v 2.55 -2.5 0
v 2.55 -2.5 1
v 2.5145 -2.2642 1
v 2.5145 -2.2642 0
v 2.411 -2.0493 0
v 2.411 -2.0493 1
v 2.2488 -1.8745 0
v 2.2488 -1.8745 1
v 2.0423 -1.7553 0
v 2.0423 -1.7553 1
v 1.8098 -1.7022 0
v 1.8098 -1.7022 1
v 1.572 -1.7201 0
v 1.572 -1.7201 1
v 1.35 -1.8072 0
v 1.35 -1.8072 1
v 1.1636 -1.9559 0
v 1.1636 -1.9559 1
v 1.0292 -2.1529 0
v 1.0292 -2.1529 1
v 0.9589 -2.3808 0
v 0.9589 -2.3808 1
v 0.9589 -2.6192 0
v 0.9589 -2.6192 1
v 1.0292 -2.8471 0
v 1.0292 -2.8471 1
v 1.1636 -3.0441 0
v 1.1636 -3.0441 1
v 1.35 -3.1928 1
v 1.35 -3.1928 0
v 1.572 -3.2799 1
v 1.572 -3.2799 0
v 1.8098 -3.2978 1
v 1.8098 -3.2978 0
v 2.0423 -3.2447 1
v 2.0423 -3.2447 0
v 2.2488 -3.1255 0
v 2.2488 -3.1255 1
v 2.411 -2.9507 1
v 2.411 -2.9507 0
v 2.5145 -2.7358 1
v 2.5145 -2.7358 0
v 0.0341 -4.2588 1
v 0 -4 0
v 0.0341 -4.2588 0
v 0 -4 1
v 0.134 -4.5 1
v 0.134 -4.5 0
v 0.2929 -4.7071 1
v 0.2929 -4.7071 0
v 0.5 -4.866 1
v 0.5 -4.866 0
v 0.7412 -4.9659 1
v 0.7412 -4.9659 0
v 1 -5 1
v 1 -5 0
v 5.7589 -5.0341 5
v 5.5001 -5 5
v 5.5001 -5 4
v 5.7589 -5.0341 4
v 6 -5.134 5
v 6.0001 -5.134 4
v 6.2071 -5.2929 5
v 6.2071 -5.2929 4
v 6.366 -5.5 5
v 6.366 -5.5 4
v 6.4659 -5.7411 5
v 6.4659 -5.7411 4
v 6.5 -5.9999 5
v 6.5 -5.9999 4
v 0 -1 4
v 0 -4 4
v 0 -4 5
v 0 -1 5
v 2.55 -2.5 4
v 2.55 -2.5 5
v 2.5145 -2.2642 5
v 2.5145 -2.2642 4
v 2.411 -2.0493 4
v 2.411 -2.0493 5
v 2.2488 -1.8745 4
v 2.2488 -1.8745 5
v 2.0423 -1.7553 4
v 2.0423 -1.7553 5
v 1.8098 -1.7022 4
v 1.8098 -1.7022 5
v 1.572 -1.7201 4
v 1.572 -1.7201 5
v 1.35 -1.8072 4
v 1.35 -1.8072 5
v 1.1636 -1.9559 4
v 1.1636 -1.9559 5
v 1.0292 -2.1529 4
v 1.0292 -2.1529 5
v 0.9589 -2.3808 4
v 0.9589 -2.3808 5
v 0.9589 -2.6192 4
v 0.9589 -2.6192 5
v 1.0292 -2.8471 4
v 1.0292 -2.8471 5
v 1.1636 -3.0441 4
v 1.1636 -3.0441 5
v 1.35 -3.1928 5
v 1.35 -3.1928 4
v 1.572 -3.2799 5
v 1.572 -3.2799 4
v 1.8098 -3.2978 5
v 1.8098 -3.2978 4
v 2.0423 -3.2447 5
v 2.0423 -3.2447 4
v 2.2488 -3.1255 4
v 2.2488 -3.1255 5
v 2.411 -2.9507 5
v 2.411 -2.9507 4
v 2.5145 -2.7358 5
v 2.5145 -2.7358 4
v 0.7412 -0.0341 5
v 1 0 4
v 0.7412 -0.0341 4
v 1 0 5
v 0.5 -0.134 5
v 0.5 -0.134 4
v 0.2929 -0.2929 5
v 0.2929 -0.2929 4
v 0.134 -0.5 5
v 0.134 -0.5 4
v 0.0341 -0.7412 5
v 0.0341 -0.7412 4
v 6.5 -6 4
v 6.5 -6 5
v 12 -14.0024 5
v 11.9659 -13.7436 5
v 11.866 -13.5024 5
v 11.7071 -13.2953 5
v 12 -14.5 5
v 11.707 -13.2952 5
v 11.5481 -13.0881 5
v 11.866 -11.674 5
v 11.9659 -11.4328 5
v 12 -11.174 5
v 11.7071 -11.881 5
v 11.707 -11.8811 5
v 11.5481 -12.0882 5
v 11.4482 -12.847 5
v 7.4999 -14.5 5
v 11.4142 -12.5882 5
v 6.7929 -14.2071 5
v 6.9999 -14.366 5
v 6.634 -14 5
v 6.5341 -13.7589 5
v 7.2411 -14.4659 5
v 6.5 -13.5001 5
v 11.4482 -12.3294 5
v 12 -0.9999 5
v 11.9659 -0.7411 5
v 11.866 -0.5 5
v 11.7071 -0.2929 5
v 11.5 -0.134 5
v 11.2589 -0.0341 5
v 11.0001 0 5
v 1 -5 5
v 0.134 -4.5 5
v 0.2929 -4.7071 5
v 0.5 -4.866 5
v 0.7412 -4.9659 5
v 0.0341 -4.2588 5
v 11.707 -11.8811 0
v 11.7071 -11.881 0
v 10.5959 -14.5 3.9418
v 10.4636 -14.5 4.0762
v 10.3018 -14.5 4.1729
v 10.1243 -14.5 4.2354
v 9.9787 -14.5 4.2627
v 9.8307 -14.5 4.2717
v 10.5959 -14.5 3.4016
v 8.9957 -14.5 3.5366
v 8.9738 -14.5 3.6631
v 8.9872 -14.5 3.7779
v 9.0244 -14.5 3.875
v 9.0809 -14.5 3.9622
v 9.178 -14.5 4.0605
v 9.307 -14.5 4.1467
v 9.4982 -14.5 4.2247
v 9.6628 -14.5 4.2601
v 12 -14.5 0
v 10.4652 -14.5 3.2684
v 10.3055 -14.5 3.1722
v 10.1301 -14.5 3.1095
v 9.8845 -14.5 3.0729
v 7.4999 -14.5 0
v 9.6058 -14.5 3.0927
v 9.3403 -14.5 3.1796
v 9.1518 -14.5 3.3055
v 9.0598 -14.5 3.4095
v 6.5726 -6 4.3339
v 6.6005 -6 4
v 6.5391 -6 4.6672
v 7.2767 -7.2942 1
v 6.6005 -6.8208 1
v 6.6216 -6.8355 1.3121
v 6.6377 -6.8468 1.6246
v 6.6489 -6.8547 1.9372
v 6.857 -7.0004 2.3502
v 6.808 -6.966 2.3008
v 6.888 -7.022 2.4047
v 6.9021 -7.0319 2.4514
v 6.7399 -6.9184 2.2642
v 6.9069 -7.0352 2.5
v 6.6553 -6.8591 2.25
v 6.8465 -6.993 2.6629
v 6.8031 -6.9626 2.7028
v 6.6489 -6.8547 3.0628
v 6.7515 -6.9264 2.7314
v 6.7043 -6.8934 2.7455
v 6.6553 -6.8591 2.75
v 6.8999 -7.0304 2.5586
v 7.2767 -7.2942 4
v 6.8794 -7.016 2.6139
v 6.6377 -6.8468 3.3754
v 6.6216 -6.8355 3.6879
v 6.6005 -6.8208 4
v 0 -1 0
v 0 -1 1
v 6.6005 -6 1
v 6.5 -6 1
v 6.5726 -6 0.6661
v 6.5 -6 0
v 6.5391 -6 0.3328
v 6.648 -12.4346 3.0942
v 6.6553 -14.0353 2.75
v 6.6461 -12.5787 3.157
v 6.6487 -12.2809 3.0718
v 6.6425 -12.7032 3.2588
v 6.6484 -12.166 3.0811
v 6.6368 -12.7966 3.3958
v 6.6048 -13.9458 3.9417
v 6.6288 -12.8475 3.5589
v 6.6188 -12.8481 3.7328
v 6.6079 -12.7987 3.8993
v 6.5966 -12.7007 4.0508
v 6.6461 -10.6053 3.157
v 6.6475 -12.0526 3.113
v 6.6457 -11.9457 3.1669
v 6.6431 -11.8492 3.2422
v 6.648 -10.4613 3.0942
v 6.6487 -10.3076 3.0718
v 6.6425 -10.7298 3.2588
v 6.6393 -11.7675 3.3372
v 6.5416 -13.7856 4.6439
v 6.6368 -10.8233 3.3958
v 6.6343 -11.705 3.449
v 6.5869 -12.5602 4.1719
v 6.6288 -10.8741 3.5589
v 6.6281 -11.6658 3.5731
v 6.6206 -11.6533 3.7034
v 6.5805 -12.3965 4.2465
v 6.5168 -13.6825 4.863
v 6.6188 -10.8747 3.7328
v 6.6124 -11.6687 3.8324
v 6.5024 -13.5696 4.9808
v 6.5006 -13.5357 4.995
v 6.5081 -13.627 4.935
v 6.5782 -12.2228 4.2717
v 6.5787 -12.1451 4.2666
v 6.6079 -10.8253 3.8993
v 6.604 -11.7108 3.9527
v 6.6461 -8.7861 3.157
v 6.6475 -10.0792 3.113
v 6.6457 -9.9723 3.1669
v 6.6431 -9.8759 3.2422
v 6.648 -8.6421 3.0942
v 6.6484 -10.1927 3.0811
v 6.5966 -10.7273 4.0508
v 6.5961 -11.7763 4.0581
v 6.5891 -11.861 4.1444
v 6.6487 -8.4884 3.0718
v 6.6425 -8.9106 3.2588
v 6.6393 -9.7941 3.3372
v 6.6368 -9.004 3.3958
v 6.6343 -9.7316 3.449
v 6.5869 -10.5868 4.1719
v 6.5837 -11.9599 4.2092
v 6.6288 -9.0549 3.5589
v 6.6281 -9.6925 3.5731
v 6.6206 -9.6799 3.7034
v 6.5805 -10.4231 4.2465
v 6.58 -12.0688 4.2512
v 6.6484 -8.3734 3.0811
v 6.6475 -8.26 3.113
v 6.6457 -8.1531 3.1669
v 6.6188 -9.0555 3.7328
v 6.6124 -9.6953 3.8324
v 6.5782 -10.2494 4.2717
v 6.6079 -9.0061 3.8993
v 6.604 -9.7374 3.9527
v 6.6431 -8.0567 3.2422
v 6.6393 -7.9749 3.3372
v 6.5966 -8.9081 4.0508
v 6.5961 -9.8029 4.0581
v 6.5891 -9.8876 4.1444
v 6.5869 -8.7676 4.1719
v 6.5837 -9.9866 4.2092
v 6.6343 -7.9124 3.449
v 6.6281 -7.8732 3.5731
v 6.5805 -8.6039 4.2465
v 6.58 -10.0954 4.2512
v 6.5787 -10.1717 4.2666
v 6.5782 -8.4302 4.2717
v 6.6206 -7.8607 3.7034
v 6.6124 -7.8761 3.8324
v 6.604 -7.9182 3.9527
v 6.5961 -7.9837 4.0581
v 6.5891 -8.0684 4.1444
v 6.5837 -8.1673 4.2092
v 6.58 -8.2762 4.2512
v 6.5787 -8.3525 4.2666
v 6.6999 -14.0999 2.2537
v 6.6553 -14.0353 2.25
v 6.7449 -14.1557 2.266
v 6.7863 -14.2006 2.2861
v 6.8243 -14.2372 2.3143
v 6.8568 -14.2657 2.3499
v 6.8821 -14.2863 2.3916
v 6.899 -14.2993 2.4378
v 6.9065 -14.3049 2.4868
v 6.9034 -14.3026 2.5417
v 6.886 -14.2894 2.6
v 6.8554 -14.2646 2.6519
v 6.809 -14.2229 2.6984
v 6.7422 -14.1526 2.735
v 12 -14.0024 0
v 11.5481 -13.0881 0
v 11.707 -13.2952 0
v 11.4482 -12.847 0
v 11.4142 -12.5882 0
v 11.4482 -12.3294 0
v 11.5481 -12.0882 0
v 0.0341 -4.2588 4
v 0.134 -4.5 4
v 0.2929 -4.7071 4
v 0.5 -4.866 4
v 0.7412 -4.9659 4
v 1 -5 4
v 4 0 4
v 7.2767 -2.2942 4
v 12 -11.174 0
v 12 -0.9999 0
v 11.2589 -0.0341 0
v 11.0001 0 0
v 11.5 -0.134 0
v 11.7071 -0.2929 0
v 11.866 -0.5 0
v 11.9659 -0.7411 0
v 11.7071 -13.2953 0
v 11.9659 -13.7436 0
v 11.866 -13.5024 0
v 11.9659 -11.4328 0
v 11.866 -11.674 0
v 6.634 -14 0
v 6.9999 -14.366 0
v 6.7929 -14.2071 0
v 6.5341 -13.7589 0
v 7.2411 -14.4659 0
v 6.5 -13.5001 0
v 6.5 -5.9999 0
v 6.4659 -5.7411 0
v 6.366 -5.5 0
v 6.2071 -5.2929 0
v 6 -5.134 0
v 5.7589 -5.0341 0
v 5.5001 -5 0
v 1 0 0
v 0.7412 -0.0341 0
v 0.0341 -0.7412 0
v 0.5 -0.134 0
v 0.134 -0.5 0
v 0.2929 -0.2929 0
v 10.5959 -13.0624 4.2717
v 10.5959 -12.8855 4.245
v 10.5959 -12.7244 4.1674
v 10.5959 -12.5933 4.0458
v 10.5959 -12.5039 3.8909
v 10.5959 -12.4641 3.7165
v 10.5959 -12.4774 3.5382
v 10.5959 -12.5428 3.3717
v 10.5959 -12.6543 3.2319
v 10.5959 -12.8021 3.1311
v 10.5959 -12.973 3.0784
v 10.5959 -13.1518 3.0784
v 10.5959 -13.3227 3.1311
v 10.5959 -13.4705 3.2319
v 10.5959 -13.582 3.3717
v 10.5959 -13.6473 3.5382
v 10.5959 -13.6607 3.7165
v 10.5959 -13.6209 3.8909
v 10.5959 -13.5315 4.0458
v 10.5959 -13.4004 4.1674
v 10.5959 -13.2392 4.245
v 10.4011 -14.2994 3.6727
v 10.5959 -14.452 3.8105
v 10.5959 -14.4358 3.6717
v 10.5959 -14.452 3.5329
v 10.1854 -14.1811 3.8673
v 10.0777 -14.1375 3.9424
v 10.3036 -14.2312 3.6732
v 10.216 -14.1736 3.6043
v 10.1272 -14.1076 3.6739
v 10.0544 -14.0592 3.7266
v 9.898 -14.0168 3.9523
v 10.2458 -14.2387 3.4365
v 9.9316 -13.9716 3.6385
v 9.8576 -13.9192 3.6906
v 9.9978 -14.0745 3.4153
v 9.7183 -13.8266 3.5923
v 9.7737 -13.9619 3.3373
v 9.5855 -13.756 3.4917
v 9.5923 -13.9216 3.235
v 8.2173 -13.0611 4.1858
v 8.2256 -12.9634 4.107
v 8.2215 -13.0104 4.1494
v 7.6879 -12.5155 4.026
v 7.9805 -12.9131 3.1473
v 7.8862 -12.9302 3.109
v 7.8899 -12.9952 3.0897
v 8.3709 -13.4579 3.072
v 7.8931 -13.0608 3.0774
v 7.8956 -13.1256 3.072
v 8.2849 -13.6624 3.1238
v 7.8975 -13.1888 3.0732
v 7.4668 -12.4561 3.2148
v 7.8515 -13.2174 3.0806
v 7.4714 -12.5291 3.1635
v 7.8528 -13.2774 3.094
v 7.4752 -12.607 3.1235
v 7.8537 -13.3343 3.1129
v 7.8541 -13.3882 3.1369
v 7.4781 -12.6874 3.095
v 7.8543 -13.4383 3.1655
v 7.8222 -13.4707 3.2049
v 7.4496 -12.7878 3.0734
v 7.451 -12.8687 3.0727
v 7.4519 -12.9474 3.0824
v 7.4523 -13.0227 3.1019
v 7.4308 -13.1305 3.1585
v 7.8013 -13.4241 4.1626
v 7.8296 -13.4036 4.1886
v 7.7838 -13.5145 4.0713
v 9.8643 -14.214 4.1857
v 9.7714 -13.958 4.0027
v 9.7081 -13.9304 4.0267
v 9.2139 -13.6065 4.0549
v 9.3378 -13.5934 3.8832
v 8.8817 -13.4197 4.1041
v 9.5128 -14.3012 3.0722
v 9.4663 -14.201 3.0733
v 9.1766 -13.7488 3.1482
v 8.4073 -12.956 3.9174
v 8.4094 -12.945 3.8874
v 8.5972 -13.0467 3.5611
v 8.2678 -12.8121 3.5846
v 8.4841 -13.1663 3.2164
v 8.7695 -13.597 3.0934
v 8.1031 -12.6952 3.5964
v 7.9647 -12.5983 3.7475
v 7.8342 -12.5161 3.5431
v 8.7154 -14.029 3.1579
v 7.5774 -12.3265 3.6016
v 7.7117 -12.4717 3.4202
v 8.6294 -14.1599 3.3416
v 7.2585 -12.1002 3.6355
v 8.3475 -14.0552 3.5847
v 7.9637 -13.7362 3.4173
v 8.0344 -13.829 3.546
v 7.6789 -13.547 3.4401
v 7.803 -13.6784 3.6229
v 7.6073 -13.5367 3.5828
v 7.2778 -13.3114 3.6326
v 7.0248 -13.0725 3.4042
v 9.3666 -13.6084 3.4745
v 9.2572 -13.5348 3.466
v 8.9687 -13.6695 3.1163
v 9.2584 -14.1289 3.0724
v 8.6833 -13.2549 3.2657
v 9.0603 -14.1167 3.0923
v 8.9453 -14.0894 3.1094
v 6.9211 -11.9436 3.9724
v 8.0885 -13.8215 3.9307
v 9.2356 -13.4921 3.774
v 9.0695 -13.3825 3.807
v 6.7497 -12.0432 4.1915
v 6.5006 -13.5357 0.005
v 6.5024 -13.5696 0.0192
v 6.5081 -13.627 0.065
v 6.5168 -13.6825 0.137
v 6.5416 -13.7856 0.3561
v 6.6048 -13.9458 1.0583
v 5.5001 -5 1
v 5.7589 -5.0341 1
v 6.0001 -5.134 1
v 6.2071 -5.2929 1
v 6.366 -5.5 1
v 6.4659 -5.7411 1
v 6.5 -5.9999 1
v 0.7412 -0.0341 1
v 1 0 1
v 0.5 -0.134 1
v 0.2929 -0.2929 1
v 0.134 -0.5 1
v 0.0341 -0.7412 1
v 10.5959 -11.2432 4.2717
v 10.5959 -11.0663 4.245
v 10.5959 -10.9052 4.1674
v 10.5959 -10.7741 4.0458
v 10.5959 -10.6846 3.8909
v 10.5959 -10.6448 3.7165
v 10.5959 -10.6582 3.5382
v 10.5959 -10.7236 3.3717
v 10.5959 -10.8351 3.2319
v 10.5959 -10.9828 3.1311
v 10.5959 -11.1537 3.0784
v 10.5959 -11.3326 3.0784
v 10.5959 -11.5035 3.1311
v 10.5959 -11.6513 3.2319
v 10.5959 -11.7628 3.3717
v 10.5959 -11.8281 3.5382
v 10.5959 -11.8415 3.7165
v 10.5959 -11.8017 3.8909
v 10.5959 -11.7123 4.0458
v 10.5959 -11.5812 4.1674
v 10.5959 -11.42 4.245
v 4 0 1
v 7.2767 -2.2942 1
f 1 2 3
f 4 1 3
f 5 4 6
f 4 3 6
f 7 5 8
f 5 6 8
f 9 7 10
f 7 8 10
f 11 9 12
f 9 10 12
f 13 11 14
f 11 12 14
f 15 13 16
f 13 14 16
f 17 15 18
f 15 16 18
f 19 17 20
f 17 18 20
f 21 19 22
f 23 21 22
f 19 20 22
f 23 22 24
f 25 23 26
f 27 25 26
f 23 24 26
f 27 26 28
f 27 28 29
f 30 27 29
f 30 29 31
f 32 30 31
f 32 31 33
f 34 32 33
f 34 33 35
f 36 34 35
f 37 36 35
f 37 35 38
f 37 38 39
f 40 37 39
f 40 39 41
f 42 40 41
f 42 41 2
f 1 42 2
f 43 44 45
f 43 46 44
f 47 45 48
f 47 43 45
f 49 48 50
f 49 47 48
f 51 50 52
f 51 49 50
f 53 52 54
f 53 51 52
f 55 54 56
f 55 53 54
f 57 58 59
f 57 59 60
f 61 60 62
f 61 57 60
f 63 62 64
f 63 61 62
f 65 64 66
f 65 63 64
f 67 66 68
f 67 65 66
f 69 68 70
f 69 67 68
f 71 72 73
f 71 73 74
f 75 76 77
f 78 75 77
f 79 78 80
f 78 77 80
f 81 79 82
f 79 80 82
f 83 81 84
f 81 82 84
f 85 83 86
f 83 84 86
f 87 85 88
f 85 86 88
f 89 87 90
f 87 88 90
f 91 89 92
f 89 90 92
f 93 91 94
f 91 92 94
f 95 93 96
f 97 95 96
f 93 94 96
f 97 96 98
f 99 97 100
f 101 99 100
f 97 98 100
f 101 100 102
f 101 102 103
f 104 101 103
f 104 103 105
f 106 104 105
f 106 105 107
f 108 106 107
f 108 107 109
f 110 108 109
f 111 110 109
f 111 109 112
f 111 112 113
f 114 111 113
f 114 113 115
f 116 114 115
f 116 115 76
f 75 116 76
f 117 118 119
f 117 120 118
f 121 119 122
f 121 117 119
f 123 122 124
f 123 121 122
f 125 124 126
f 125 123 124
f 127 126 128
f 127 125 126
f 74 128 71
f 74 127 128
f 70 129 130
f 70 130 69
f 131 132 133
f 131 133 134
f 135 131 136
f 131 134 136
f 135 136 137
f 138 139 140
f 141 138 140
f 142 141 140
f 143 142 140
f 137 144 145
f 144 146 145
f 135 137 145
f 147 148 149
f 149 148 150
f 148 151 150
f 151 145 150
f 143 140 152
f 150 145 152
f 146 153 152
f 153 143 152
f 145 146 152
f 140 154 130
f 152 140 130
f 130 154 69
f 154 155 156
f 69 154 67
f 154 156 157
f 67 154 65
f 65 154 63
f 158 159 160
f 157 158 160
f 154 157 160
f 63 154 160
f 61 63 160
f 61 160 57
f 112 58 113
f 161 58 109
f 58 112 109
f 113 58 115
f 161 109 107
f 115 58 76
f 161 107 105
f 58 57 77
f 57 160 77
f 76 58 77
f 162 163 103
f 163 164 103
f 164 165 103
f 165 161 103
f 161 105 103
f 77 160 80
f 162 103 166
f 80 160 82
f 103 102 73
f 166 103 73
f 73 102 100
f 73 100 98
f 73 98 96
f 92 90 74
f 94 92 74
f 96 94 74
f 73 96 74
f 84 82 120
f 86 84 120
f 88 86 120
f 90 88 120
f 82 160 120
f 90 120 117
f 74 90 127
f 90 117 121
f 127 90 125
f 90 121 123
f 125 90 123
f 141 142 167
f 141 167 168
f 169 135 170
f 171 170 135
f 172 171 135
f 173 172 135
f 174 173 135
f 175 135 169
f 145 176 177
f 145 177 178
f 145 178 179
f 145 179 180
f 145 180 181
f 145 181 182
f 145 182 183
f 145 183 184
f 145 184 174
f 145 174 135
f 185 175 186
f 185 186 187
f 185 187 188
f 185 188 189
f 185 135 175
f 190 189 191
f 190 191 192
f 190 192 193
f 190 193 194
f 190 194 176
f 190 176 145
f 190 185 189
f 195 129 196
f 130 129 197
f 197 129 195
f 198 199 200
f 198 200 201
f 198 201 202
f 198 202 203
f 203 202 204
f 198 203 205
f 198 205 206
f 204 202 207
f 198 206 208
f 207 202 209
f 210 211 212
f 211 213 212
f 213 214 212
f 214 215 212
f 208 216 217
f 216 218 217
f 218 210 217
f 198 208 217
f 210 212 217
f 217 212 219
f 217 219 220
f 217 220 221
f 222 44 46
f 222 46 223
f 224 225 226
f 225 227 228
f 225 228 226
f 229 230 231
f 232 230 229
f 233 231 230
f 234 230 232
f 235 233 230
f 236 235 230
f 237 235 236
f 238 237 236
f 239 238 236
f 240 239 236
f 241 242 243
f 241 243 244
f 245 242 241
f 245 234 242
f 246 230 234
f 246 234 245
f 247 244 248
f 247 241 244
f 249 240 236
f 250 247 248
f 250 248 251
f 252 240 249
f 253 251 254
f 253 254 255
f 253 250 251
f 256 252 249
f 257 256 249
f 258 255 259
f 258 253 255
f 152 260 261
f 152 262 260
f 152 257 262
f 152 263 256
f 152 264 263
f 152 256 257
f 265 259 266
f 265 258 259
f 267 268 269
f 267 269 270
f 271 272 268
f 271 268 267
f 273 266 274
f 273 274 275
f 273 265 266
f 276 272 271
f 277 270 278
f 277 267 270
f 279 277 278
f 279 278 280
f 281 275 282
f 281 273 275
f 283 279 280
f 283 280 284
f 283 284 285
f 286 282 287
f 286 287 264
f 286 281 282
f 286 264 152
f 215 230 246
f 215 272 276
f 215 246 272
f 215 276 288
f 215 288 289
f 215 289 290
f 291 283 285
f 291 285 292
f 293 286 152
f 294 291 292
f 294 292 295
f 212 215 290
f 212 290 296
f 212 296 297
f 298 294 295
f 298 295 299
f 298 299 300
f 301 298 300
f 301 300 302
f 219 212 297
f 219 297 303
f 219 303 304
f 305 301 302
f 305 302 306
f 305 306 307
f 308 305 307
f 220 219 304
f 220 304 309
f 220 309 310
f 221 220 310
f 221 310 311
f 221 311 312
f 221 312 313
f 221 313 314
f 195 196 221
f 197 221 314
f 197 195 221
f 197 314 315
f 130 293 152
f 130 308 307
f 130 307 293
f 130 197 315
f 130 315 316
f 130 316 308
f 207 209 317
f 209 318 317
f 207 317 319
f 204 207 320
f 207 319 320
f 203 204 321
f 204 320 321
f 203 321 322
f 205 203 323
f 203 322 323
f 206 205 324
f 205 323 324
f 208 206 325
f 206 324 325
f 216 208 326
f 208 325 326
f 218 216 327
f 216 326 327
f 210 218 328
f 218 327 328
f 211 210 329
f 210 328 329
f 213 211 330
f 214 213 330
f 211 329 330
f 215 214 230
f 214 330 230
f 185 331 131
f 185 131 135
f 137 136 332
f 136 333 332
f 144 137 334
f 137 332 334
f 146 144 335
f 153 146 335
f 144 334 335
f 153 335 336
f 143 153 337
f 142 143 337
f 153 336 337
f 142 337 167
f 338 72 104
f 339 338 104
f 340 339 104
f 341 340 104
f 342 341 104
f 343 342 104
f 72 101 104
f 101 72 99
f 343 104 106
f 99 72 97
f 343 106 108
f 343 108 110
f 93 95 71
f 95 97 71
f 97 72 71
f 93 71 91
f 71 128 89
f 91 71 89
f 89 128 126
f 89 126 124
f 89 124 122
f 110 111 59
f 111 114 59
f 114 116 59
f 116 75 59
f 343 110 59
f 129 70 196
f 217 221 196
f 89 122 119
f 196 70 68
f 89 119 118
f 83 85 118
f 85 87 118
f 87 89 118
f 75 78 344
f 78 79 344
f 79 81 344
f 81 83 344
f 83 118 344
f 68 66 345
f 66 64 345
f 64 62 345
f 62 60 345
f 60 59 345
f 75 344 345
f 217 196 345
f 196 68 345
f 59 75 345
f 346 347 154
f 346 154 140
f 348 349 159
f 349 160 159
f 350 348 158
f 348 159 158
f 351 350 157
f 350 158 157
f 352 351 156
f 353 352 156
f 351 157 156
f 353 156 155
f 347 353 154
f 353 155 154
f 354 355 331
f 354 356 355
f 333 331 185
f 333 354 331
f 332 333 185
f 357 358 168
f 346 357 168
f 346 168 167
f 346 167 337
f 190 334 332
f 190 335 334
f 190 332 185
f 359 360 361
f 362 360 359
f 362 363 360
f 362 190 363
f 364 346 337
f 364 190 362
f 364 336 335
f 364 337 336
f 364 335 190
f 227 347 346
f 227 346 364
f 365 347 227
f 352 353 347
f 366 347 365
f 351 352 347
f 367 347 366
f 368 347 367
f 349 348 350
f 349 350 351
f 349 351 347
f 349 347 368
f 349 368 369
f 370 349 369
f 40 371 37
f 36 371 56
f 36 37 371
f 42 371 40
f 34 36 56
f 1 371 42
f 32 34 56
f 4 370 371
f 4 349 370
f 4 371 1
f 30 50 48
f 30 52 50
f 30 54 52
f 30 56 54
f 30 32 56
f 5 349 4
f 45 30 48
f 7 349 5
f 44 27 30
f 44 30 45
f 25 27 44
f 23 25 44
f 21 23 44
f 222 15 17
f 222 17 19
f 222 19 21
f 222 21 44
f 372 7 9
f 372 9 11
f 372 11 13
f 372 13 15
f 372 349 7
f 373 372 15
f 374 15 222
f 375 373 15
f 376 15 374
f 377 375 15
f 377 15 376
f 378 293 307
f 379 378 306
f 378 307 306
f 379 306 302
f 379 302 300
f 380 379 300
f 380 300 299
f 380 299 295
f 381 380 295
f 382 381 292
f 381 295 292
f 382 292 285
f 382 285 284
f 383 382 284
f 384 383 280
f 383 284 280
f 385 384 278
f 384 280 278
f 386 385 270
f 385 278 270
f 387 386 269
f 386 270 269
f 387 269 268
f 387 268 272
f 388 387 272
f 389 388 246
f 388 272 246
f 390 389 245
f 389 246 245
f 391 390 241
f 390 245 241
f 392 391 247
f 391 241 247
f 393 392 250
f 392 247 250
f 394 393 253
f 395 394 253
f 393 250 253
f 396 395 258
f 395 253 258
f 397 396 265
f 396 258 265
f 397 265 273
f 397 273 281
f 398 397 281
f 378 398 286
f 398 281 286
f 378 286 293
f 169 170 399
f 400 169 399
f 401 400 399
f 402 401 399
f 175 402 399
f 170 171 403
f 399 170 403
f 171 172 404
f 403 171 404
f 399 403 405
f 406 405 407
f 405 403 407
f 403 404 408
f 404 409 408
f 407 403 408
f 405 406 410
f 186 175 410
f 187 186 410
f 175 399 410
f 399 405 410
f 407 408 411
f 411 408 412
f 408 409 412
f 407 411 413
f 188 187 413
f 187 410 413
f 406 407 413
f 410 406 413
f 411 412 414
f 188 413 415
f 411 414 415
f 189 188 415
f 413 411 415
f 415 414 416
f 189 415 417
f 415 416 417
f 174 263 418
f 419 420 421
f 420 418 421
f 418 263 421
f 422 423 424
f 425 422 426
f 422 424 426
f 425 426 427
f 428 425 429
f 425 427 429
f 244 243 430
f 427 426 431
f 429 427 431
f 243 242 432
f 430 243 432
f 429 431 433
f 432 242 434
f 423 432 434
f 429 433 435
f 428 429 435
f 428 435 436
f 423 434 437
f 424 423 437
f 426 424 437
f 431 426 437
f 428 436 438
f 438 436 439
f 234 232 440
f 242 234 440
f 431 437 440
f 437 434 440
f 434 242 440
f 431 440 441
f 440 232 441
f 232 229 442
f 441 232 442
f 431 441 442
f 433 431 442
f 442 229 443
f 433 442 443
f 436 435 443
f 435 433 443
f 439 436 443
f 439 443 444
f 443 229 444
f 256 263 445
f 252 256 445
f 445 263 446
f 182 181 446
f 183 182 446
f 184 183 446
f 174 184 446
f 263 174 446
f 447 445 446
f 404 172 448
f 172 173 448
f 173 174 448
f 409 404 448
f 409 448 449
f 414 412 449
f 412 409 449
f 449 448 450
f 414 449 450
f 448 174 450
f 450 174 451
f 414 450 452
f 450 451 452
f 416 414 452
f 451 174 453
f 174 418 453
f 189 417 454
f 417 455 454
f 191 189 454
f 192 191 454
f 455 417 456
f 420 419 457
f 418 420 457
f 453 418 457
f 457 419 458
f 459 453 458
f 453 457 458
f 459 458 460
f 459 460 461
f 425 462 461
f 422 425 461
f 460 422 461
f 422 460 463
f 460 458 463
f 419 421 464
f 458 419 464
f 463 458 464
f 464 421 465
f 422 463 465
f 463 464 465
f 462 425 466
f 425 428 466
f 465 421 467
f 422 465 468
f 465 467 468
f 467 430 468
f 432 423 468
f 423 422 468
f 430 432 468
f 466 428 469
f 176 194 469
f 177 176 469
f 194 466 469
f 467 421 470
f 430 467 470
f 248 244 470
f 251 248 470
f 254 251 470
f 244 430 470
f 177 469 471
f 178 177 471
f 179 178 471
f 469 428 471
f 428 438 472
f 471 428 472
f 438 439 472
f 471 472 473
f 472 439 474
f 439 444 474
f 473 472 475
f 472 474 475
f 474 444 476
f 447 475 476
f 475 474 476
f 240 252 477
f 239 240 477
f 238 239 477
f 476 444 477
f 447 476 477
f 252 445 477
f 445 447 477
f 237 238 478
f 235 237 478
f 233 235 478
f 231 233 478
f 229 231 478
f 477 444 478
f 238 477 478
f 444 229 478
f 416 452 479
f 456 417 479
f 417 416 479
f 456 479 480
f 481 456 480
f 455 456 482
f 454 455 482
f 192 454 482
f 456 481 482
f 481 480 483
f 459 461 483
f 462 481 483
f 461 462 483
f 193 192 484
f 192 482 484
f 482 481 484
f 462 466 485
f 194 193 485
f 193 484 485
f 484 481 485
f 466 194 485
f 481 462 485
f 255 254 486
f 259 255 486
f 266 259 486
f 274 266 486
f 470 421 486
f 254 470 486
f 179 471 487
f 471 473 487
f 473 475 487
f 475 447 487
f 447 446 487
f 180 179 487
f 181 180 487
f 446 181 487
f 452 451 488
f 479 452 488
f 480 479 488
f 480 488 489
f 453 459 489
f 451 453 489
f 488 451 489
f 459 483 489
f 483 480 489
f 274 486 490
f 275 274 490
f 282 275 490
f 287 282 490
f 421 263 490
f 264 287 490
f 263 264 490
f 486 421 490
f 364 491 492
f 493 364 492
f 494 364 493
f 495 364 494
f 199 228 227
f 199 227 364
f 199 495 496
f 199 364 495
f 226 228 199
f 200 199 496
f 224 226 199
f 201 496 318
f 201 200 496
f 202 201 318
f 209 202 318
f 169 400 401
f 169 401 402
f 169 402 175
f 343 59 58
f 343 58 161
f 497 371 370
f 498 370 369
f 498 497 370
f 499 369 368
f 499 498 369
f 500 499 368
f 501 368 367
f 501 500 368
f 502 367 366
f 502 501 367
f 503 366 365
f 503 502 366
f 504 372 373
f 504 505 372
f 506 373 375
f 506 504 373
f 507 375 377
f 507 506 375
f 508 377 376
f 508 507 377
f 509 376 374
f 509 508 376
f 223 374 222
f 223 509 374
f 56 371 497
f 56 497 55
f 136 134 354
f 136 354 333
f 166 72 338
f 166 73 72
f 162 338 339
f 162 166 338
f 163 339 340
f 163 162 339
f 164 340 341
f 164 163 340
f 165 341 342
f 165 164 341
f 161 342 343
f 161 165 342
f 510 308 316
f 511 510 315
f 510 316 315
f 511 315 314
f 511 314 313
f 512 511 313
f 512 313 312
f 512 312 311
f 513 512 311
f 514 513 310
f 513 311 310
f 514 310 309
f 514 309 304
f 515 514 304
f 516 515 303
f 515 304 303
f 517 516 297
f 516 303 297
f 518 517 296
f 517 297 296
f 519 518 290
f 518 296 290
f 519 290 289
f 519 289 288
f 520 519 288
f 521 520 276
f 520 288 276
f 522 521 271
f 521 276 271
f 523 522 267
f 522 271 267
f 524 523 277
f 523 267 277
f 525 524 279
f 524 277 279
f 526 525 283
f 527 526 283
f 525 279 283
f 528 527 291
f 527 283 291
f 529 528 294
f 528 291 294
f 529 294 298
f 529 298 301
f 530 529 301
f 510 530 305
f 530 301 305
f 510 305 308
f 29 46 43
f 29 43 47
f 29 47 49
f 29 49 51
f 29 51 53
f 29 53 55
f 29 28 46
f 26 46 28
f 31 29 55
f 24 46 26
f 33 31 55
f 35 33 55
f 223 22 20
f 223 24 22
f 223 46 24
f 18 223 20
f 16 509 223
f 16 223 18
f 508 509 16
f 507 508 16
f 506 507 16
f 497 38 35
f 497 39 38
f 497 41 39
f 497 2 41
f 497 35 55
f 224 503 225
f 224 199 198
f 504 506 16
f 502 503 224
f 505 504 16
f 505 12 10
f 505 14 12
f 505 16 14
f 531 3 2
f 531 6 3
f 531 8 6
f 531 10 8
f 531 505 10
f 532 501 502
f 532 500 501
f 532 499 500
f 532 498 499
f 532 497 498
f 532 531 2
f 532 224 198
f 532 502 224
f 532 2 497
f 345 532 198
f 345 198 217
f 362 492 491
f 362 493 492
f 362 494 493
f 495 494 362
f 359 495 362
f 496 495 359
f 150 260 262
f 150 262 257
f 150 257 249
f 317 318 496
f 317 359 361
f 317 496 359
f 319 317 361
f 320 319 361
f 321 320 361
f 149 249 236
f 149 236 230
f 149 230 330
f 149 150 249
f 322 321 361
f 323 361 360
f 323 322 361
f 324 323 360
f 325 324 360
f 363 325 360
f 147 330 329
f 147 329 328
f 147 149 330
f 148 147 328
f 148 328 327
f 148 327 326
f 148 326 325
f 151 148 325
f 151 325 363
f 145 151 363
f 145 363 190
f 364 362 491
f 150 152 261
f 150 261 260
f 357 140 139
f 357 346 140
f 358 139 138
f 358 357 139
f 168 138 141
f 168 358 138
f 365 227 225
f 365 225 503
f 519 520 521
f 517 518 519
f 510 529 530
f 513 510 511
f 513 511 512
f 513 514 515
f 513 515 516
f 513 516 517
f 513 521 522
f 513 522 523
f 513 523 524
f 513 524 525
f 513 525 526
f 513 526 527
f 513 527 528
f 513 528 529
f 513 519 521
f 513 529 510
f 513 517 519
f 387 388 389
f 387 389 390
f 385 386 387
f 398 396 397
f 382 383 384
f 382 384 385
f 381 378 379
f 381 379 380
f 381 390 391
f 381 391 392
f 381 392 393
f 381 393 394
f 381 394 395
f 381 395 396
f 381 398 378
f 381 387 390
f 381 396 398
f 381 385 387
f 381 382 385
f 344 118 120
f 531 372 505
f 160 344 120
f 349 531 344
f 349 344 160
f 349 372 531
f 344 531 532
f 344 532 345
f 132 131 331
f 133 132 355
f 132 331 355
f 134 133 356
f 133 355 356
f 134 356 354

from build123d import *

# Parameters (mm, degrees)
BOSS_EXTRUDE1_DEPTH = 5
SKETCH4_R           = 0.8
CUT_EXTRUDE3_DEPTH  = 20.474342094
SKETCH5_W           = 4
SKETCH5_H           = 3
CUT_EXTRUDE4_DEPTH  = 13
FILLET4_R           = 1
CUT_EXTRUDE5_DEPTH  = 20.474342094
FILLET6_R           = 1
CUT_EXTRUDE6_START  = -8.5
CUT_EXTRUDE6_DEPTH  = 8.037702488
SKETCH11_W          = 3
SKETCH11_H          = 5
CUT_EXTRUDE8_DEPTH  = 4
SKETCH12_R          = 0.6
CUT_EXTRUDE9_DEPTH  = 5
CUT_EXTRUDE10_REACH = 21.474
SKETCH9_R           = 0.25


# Read off the part's stored shape, not the designer's step: Cut-Extrude6
with BuildPart() as part:
    # Sketch1 → Boss-Extrude1 (new body)
    with BuildSketch(Plane.XY):
        Polygon((0, 0), (12, 0), (12, -14.5), (6.5, -14.5), (6.5, -5), (0, -5), align=None)
    extrude(amount=BOSS_EXTRUDE1_DEPTH)

    # Sketch4 → Cut-Extrude3 (cut, through all)
    with BuildSketch(Plane.XY.offset(5)):
        with Locations((1.75, -2.5)):
            Circle(SKETCH4_R)
    extrude(amount=-CUT_EXTRUDE3_DEPTH, mode=Mode.SUBTRACT)

    # Sketch5 → Cut-Extrude4 (cut)
    with BuildSketch(Plane(origin=(0, 0, 0), x_dir=(1, 0, 0), z_dir=(0, 1, 0))):
        with Locations((2, -2.5)):
            Rectangle(SKETCH5_W, SKETCH5_H)
    extrude(amount=-CUT_EXTRUDE4_DEPTH, mode=Mode.SUBTRACT)

    # Fillet4
    fillet4_edges = [part.edges().sort_by_distance(p)[0] for p in [
        (0, 0, 4.5),
        (0, -5, 4.5),
        (0, 0, 0.5),
        (0, -5, 0.5),
    ]]
    fillet(fillet4_edges, radius=FILLET4_R)

    # Sketch6 → Cut-Extrude5 (cut, through all)
    with BuildSketch(Plane.XY.offset(5)):
        Polygon((12, -13.588182425), (11, -12.588182425), (12, -11.588182425), align=None)
    extrude(amount=-CUT_EXTRUDE5_DEPTH, mode=Mode.SUBTRACT)

    # Fillet6
    fillet6_edges = [part.edges().sort_by_distance(p)[0] for p in [
        (11, -12.588182425, 2.5),
        (12, -13.588182425, 2.5),
        (12, -11.588182425, 2.5),
        (6.5, -5, 2.5),
        (6.5, -14.5, 2.5),
        (12, 0, 2.5),
    ]]
    fillet(fillet6_edges, radius=FILLET6_R - 0.0001)  # a hair under: the kernel refuses the full size

    # Cut-Extrude6 outline → Cut-Extrude6 (cut)
    with BuildSketch(Plane.XZ.offset(14.5).offset(CUT_EXTRUDE6_START)):
        with BuildLine():
            Line((6.499992217, 5.000061772), (6.49999198, -6.3653e-05))
            ThreePointArc((6.49999198, -6.3653e-05), (6.656865167, 2.499999052), (6.499992217, 5.000061772))
        make_face()
    extrude(amount=CUT_EXTRUDE6_DEPTH, mode=Mode.SUBTRACT)

    # Sketch11 → Cut-Extrude8 (cut, along a direction that is not the sketch's normal)
    with BuildSketch(Plane.ZY.offset(-4)):
        with Locations((2.5, -2.5)):
            Rectangle(SKETCH11_W, SKETCH11_H)
    extrude(amount=-CUT_EXTRUDE8_DEPTH, dir=(-0.8191736087025463, 0.5735456379445732, 0), mode=Mode.SUBTRACT)

    # Sketch12 → Cut-Extrude9 (cut, along a direction that is not the sketch's normal)
    with BuildSketch(Plane.ZY.offset(-6.5)):
        with Locations((3.671694189, -8.375443102)):
            Circle(SKETCH12_R)
        with Locations((3.671694189, -10.194652501)):
            Circle(SKETCH12_R)
        with Locations((3.671694189, -12.168032187)):
            Circle(SKETCH12_R)
    extrude(amount=-CUT_EXTRUDE9_DEPTH, dir=(-0.8191736087025463, 0.5735456379445732, 0), mode=Mode.SUBTRACT)

    # Cut-Extrude10: up to this plane
    cut_extrude10_end = Plane(origin=(7.276694435, -7.294182552, 1), z_dir=(-0.5735456379445732, -0.8191736087025463, 0))
    # Sketch9 → Cut-Extrude10 (cut, up to the surface)
    with BuildSketch(Plane.XZ.offset(14.5), mode=Mode.PRIVATE) as cut_extrude10_sk1:
        with Locations((6.656865167, 2.5)):
            Circle(SKETCH9_R)
    cut_extrude10_tool1 = split(extrude(cut_extrude10_sk1.sketch, amount=-CUT_EXTRUDE10_REACH, mode=Mode.PRIVATE), bisect_by=cut_extrude10_end, keep=Keep.BOTH, mode=Mode.PRIVATE)
    add(cut_extrude10_tool1.solids().sort_by_distance((6.656865, -14.5, 2.5))[0], mode=Mode.SUBTRACT)


solid = part.part
